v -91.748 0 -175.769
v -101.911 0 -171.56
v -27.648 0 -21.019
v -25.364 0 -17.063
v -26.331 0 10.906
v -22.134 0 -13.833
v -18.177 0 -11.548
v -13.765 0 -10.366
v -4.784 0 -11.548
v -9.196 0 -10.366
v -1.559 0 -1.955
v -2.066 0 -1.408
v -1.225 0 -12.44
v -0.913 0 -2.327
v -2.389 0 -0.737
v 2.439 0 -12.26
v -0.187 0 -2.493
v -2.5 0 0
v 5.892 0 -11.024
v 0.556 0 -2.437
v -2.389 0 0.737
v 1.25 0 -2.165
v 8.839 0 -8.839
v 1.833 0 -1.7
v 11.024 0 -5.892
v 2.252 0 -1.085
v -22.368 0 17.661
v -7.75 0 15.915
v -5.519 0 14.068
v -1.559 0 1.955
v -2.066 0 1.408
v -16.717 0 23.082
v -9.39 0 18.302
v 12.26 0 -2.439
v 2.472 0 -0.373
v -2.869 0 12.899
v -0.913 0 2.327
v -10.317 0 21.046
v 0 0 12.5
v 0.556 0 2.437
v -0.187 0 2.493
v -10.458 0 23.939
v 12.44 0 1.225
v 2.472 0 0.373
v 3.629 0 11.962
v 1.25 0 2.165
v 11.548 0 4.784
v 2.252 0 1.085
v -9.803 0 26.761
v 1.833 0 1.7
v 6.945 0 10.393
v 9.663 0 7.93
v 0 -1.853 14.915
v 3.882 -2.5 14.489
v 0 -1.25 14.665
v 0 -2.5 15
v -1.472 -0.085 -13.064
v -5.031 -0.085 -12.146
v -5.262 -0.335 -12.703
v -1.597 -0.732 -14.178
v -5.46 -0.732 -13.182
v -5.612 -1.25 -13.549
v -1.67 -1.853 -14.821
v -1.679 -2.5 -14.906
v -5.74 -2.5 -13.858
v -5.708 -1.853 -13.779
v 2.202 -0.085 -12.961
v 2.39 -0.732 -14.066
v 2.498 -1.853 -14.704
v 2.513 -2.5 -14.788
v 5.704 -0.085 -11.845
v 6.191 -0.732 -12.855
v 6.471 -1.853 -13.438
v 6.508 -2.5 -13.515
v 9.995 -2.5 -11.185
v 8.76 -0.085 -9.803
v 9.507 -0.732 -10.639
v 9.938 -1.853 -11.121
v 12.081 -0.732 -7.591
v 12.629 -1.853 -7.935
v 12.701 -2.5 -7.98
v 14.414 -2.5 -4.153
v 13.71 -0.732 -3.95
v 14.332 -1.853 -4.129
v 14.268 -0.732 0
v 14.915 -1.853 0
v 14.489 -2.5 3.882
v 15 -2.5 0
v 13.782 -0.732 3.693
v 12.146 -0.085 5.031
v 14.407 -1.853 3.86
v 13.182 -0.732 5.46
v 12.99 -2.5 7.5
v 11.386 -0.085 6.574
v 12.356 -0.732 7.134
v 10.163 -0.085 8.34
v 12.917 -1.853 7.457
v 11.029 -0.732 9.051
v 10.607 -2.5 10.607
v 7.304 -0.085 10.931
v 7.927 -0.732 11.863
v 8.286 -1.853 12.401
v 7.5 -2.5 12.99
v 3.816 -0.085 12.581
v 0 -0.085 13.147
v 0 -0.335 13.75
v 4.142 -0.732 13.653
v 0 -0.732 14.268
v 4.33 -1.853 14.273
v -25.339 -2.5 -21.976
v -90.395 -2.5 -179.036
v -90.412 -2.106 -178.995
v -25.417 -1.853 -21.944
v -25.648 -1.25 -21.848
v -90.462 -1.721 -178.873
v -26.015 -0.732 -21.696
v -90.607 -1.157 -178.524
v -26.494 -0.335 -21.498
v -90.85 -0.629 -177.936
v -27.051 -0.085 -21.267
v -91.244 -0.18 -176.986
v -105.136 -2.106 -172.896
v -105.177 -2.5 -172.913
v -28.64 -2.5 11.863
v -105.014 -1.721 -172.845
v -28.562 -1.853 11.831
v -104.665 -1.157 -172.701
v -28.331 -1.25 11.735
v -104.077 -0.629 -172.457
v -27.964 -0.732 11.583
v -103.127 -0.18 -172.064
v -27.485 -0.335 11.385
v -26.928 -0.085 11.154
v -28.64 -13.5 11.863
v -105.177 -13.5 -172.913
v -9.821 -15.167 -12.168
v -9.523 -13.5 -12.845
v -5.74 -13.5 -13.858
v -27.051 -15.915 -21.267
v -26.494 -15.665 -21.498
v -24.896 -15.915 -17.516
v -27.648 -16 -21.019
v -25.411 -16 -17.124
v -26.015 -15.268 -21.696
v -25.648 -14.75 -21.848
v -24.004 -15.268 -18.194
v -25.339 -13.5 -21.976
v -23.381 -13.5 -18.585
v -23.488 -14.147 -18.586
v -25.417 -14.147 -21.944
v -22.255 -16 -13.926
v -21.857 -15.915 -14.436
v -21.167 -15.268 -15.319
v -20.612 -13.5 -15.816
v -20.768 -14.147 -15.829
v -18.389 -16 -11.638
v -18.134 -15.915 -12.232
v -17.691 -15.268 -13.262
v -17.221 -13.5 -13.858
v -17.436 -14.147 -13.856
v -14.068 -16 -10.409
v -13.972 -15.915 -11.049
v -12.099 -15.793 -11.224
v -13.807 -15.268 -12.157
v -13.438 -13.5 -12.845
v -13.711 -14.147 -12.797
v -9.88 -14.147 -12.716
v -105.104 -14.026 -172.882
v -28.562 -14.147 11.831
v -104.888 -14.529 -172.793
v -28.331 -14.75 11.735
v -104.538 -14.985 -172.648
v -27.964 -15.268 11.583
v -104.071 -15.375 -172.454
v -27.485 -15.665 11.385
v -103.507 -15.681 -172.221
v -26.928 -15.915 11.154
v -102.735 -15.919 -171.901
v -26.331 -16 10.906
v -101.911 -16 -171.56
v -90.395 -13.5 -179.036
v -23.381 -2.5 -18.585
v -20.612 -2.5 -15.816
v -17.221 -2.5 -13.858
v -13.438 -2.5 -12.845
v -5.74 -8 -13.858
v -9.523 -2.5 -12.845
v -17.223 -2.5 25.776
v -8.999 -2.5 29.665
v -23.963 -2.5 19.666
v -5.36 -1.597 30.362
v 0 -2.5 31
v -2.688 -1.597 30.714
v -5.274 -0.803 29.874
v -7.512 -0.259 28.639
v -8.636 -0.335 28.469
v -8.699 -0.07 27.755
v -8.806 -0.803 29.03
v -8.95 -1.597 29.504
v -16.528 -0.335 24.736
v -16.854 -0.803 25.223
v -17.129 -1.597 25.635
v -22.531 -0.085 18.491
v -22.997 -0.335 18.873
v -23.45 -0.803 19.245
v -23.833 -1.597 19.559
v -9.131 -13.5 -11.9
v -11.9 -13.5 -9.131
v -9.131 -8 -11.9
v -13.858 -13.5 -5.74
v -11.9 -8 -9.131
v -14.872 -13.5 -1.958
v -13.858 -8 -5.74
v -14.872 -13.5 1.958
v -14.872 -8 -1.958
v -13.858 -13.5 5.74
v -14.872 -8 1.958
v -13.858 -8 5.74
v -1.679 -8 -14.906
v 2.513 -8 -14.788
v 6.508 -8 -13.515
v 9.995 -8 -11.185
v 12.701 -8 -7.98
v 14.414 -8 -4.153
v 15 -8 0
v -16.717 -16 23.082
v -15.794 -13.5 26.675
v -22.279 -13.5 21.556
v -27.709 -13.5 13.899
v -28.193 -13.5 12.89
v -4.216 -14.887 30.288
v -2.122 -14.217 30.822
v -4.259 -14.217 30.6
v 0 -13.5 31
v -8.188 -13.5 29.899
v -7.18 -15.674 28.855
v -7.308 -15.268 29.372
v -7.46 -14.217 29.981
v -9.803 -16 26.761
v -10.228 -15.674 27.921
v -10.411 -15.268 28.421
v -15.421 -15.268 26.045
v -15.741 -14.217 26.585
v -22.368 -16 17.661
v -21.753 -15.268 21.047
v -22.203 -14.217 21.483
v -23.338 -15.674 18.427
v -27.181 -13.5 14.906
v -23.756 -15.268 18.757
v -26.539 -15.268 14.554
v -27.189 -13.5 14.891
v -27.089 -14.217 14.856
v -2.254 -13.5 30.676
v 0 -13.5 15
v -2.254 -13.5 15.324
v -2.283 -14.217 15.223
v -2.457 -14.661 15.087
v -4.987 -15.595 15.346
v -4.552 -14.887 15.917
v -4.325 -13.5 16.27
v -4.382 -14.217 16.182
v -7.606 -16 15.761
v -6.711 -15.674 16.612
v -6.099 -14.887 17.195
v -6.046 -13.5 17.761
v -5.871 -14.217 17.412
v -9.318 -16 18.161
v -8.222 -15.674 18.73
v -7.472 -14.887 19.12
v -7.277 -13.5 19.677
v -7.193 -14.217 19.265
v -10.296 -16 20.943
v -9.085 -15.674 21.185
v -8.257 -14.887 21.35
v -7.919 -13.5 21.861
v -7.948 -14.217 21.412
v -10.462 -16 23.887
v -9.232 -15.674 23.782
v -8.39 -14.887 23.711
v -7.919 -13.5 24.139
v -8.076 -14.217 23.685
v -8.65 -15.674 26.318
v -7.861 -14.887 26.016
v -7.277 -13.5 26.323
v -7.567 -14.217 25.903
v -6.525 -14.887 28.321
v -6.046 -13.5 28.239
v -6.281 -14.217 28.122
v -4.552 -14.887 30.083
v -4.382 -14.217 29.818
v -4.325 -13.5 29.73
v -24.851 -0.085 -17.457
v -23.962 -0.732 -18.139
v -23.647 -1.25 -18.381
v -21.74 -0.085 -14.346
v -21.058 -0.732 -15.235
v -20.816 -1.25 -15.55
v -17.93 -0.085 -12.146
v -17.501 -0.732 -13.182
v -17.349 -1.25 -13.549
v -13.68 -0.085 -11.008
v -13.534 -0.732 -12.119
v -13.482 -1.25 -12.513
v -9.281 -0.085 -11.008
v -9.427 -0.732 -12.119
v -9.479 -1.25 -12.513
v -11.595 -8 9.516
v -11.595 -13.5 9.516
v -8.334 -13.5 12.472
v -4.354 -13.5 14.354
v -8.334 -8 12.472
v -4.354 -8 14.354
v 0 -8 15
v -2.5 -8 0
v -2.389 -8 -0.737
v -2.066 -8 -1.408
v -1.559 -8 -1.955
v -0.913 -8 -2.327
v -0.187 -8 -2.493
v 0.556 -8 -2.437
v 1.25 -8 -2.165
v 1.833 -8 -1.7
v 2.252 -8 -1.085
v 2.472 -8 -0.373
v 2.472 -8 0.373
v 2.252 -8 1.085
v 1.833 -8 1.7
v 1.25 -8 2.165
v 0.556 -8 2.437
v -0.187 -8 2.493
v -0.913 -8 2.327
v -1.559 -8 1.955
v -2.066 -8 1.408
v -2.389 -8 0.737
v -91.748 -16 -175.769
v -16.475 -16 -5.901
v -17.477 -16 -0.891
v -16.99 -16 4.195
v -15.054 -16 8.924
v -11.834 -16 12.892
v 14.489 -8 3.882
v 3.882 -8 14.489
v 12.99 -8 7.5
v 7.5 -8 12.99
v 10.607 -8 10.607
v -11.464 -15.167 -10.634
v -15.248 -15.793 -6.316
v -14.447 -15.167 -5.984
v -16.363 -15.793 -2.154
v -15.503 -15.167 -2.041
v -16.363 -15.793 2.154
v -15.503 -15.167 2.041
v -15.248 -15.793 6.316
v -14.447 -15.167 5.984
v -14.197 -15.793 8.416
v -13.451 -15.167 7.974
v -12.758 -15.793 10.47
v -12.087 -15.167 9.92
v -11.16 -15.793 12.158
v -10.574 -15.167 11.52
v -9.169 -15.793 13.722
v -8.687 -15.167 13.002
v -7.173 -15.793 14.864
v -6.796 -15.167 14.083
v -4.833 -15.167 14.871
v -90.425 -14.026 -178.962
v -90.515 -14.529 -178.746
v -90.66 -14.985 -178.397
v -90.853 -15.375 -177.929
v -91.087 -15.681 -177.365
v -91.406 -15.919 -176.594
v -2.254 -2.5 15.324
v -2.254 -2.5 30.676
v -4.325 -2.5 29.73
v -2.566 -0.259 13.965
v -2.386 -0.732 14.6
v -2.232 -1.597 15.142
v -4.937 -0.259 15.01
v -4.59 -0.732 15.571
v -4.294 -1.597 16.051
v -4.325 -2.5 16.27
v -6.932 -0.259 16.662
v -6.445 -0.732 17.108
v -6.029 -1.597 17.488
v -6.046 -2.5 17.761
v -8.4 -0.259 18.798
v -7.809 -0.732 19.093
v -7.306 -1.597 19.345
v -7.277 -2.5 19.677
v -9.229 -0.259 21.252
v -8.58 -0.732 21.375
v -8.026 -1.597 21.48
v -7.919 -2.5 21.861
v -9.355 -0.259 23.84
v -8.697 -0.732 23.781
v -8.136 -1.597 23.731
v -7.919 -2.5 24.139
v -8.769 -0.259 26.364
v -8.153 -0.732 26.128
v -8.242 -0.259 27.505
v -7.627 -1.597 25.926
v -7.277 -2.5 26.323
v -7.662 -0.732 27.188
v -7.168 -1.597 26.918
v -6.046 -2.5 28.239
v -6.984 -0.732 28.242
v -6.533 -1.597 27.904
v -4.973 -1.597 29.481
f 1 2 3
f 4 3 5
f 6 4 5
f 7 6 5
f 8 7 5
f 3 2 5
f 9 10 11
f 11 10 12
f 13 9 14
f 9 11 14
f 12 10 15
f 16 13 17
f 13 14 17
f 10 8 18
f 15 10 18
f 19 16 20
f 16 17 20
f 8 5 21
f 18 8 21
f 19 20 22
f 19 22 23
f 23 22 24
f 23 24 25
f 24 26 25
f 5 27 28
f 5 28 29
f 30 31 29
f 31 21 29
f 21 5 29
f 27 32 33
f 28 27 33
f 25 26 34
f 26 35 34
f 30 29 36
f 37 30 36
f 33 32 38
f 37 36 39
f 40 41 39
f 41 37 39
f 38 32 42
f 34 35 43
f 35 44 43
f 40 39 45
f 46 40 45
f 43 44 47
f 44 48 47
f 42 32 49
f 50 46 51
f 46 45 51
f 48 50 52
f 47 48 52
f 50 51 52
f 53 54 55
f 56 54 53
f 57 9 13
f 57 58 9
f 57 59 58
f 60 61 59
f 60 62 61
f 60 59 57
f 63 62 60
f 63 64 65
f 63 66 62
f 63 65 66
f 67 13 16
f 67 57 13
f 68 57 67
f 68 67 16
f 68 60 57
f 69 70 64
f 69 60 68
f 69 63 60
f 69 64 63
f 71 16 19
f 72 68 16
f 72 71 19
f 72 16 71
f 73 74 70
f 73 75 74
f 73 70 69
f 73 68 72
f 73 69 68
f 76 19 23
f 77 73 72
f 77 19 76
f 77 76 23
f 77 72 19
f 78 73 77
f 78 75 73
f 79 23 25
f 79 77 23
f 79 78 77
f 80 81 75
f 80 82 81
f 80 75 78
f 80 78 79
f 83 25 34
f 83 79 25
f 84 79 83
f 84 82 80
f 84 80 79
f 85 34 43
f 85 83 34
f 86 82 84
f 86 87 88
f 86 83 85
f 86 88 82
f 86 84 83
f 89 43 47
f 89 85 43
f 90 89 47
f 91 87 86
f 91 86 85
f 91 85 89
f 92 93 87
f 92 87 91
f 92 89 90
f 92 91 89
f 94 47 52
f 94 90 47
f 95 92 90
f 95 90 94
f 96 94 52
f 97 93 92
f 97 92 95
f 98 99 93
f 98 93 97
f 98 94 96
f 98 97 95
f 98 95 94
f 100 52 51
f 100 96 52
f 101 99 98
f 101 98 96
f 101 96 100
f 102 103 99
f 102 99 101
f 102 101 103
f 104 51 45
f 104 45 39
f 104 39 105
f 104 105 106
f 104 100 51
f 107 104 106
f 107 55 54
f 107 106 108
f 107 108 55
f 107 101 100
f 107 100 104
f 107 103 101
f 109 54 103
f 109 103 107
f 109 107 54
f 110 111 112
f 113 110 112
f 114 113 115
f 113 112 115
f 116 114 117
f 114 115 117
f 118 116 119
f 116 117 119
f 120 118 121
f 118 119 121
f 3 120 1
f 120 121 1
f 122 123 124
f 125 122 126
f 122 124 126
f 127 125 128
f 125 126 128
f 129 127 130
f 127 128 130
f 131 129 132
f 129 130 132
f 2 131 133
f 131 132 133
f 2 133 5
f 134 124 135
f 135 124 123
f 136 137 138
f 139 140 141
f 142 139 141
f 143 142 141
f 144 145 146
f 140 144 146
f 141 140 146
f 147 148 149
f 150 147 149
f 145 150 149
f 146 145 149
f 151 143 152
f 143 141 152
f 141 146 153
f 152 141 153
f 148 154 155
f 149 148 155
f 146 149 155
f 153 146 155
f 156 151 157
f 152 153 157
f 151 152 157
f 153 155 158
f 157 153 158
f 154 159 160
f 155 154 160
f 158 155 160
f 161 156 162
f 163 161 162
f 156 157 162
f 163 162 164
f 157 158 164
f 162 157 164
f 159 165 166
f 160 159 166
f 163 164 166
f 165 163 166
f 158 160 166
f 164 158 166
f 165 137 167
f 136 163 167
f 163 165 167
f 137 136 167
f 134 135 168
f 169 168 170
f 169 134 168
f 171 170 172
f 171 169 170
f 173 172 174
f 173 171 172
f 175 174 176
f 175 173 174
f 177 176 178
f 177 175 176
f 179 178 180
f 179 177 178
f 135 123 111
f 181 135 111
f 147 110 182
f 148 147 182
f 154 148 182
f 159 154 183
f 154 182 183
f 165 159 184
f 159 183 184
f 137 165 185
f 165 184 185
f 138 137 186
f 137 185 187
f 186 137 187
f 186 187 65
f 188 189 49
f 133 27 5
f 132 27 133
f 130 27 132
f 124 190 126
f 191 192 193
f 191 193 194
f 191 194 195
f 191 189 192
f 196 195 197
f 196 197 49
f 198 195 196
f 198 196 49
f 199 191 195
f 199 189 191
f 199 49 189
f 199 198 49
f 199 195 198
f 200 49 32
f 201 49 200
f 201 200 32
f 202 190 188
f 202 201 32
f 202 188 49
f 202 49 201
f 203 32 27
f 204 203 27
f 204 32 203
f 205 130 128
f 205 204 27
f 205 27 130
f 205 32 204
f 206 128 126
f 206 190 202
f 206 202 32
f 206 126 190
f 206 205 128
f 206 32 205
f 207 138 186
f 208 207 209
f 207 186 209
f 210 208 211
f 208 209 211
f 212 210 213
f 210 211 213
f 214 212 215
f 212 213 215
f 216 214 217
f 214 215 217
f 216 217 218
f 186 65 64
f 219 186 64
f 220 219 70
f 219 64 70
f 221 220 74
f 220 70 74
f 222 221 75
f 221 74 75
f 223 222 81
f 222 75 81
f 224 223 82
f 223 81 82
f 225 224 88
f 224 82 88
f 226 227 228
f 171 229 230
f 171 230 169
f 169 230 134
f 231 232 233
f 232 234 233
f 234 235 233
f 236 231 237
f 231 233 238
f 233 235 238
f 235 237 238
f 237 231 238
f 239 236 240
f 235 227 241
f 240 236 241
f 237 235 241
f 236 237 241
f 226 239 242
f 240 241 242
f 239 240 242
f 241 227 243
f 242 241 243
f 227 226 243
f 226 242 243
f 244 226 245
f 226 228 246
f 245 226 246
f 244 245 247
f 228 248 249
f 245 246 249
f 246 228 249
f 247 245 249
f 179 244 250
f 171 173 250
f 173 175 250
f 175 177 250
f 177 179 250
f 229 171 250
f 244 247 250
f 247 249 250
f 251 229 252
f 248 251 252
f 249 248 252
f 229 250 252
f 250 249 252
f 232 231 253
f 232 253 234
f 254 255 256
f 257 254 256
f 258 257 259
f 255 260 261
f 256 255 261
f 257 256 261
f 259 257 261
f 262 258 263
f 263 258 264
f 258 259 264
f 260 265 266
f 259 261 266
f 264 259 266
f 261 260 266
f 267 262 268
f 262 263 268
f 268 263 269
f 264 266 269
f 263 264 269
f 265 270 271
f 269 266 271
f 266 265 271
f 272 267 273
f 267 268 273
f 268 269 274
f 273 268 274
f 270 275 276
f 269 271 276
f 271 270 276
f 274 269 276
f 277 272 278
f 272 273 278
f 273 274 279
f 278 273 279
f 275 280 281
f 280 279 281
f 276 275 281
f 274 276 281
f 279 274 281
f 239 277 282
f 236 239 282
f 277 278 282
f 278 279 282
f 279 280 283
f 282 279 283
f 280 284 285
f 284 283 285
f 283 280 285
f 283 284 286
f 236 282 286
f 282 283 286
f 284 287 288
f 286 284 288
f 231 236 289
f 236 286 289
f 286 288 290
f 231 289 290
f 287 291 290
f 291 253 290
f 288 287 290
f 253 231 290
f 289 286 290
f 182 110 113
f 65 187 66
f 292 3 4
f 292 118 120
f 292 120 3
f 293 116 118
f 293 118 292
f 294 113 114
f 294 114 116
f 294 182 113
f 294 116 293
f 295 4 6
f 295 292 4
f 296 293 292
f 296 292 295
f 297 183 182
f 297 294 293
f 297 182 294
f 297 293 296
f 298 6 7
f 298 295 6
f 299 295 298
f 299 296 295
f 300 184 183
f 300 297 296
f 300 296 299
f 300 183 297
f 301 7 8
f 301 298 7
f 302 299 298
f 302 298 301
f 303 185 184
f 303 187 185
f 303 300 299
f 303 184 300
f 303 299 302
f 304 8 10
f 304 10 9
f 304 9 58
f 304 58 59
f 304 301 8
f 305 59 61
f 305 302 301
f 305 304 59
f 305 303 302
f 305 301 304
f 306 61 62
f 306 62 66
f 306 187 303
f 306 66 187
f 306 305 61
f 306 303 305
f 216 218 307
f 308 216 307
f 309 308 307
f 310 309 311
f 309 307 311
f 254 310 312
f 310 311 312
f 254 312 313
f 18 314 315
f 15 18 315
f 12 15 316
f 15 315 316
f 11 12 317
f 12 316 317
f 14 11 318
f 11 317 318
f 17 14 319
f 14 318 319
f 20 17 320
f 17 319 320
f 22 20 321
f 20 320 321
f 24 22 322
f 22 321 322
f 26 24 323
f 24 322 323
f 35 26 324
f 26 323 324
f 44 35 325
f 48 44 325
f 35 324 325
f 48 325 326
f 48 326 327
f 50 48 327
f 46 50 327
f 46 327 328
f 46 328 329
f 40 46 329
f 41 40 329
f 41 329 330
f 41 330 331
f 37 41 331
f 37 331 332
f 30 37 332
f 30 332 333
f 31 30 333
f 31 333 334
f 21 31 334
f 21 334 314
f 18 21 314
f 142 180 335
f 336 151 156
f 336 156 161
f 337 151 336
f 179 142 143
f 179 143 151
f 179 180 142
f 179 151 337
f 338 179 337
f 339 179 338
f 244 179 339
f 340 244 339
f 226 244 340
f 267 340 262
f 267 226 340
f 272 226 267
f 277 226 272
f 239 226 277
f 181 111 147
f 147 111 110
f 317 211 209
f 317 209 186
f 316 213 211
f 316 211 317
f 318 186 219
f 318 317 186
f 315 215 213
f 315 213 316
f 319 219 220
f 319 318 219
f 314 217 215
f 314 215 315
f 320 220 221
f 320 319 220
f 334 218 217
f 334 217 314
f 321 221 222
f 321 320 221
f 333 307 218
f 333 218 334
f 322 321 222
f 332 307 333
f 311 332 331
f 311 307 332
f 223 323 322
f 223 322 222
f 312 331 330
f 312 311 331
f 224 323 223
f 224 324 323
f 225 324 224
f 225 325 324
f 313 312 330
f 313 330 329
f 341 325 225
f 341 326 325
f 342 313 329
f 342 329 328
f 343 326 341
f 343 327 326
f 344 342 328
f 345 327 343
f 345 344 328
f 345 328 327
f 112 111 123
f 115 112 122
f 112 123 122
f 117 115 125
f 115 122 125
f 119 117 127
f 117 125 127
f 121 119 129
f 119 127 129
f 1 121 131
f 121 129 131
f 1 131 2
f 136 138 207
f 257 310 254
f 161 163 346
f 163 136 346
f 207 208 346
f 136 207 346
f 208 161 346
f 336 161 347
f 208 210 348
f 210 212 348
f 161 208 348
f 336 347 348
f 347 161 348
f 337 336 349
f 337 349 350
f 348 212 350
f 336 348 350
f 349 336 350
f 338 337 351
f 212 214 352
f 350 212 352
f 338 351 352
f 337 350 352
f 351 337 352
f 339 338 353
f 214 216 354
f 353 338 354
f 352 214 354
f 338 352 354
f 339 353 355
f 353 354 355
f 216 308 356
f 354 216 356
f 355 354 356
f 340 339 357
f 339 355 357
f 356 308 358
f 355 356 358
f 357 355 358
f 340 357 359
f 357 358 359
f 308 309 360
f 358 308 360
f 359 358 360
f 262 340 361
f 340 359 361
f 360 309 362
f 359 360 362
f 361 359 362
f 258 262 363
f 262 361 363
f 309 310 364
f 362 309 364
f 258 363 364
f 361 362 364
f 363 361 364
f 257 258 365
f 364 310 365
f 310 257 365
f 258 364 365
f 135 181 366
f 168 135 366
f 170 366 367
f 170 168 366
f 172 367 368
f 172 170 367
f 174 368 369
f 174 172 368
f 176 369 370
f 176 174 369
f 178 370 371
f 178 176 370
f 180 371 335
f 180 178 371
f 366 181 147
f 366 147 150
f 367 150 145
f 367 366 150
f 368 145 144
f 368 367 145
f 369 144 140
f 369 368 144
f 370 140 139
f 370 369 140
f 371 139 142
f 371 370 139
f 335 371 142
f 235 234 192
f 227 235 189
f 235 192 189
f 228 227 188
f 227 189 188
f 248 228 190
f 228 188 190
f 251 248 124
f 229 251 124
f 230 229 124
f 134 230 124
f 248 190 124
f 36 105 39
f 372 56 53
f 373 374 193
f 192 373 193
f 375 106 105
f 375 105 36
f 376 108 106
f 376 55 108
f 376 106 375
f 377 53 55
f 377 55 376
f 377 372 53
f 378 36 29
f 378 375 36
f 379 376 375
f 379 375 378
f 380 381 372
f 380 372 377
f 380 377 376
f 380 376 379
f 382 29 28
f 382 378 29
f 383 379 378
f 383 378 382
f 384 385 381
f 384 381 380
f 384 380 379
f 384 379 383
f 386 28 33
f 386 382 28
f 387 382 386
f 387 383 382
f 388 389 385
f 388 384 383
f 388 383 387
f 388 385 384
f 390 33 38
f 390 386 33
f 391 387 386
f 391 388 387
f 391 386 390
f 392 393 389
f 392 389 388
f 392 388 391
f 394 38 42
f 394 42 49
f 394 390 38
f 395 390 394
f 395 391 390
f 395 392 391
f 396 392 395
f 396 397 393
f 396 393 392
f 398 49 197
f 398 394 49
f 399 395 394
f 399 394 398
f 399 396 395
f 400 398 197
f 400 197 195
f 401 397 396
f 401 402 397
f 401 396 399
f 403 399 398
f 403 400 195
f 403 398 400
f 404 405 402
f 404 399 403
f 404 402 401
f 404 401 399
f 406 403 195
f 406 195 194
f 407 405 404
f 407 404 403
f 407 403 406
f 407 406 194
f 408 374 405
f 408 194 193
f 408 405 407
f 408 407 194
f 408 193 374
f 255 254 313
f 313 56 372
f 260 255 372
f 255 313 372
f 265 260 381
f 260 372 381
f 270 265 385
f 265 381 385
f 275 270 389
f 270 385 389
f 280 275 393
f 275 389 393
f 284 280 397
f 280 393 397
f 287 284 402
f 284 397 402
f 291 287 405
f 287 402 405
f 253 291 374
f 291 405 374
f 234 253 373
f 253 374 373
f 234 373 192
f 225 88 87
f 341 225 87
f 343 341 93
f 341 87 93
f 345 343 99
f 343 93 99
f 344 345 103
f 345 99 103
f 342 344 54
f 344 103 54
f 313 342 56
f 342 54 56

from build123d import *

# Parameters (mm, degrees)
F1_DEPTH     = 16
F2_DEPTH     = 8
F3_T1_DEPTH  = 28.5
F3_T3_DEPTH  = 176.25
F3_T5_DEPTH  = 206.25
F3_T8_ANGLE  = 113.8828315396
F3_T10_ANGLE = 205.3052563157
F3_T12_ANGLE = 301.0526480562
F3_T14_ANGLE = 87.1421031631
F3_T16_ANGLE = 90
F3_T18_ANGLE = 202.4999999088
F3_T20_ANGLE = 256.2183340246
F3_T22_ANGLE = 87.1421031631
F4_D         = 5


# Not quite as in the source:
# - a fillet or chamfer that OpenCascade refuses, or shapes differently, is made with other operations: its cross-section is extruded or revolved along the edge and cut away or added


with BuildPart() as f1:
    # F0 (on Front) → F1 (new body)
    with BuildSketch(Plane.XZ):
        Polygon((-25.3386959586, -21.9761344899), (-13.8581929877, 5.7402514855), (-28.6402655078, 11.8631864033), (-105.1769519809, -172.9127200989), (-90.3948794607, -179.0356550168), align=None)
        with BuildLine():
            Line((-28.6402655078, 11.8631864033), (-13.8581929877, 5.7402514855))
            ThreePointArc((-13.8581929877, 5.7402514855), (-8.3335534854, 12.4720441912), (2.39e-08, 15))
            ThreePointArc((2.39e-08, 15), (-8, 22.9999999881), (0, 31))
            ThreePointArc((0, 31), (-17.2226772236, 25.7755579814), (-28.6402655078, 11.8631864033))
        make_face()
        with BuildLine():
            ThreePointArc((-5.7402514855, -13.8581929877), (-13.8581929877, -5.7402514855), (-13.8581929877, 5.7402514855))
            Line((-13.8581929877, 5.7402514855), (-25.3386959586, -21.9761344899))
            ThreePointArc((-25.3386959586, -21.9761344899), (-17.2207544564, -13.8581929877), (-5.7402514855, -13.8581929877))
        make_face()
    extrude(amount=F1_DEPTH)

    # F0 (on Front) → F2 (join)
    with BuildSketch(Plane.XZ):
        with BuildLine():
            Line((0, 0), (-13.8581929877, 5.7402514855))
            ThreePointArc((-13.8581929877, 5.7402514855), (-13.8581929877, -5.7402514855), (-5.7402514855, -13.8581929877))
            Line((-5.7402514855, -13.8581929877), (0, 0))
        make_face()
        with BuildLine():
            ThreePointArc((2.39e-08, 15), (-8.3335534854, 12.4720441912), (-13.8581929877, 5.7402514855))
            Line((-13.8581929877, 5.7402514855), (0, 0))
            Line((0, 0), (-5.7402514855, -13.8581929877))
            ThreePointArc((-5.7402514855, -13.8581929877), (8.3335534953, -12.4720441845), (15, 0))
            ThreePointArc((15, 0), (10.6066017262, 10.6066017094), (2.39e-08, 15))
        make_face()
    extrude(amount=F2_DEPTH)

    # F3: fillet of radius 2.5 on 14 edges, made by hand

    # F3_s2 → F3_t1 (cut)
    with BuildSketch(Plane(origin=(-34.414512586, 0, 14.2549578556), x_dir=(0, 1, 0), z_dir=(0.9238795325, 0, -0.3826834324))):
        with BuildLine():
            ThreePointArc((-13.5, -200), (-15.267766953, -199.267766953), (-16, -197.5))
            Line((-16, -197.5), (-16, -200))
            Line((-16, -200), (-13.5, -200))
        make_face()
        with BuildLine():
            ThreePointArc((-2.5, -200), (-0.732233047, -199.267766953), (0, -197.5))
            Line((0, -197.5), (0, -200))
            Line((0, -200), (-2.5, -200))
        make_face()
    extrude(amount=F3_T1_DEPTH, mode=Mode.SUBTRACT)

    # F3_s4 → F3_t3 (cut)
    with BuildSketch(Plane(origin=(-78.9284579253, 0, -190.5501535805), x_dir=(0, 1, 0), z_dir=(0.3826834324, 0, 0.9238795325))):
        with BuildLine():
            ThreePointArc((-13.5, 15), (-15.267766953, 15.732233047), (-16, 17.5))
            Line((-16, 17.5), (-16, 15))
            Line((-16, 15), (-13.5, 15))
        make_face()
        with BuildLine():
            ThreePointArc((-2.5, 15), (-0.732233047, 15.732233047), (0, 17.5))
            Line((0, 17.5), (0, 15))
            Line((0, 15), (-2.5, 15))
        make_face()
    extrude(amount=F3_T3_DEPTH, mode=Mode.SUBTRACT)

    # F3_s6 → F3_t5 (cut)
    with BuildSketch(Plane(origin=(0, 0, 0), x_dir=(0, 1, 0), z_dir=(-0.3826834324, 0, -0.9238795325))):
        with BuildLine():
            ThreePointArc((-13.5, -31), (-15.267766953, -30.267766953), (-16, -28.5))
            Line((-16, -28.5), (-16, -31))
            Line((-16, -31), (-13.5, -31))
        make_face()
        with BuildLine():
            ThreePointArc((-2.5, -31), (-0.732233047, -30.267766953), (0, -28.5))
            Line((0, -28.5), (0, -31))
            Line((0, -31), (-2.5, -31))
        make_face()
    extrude(amount=F3_T5_DEPTH, mode=Mode.SUBTRACT)

    # F3_s7 → F3_t8 (revolve, cut)
    with BuildSketch(Plane(origin=(-11.480502971, 0, -27.7163859753), x_dir=(0, 1, 0), z_dir=(-0.3826834324, 0, -0.9238795325))):
        with BuildLine():
            ThreePointArc((-16, -17.5), (-15.267766953, -15.732233047), (-13.5, -15))
            Line((-13.5, -15), (-16, -15))
            Line((-16, -15), (-16, -17.5))
        make_face()
    revolve(axis=Axis((-11.480502971, -16, -27.7163859753), (0, 1, 0)), revolution_arc=F3_T8_ANGLE, mode=Mode.SUBTRACT)

    # F3_s9 → F3_t10 (revolve, cut)
    with BuildSketch(Plane(origin=(0, 0, 0), x_dir=(0, 1, 0), z_dir=(0.999700368, 0, 0.0244780336))):
        with BuildLine():
            ThreePointArc((-16, -17.5), (-15.267766953, -15.732233047), (-13.5, -15))
            Line((-13.5, -15), (-16, -15))
            Line((-16, -15), (-16, -17.5))
        make_face()
    revolve(axis=Axis((0, -16, 0), (0, 1, 0)), revolution_arc=F3_T10_ANGLE, mode=Mode.SUBTRACT)

    # F3_s11 → F3_t12 (revolve, cut)
    with BuildSketch(Plane(origin=(11.4998076678, 0, 11.4334898289), x_dir=(0, 1, 0), z_dir=(0.7091486068, 0, 0.7050590425))):
        with BuildLine():
            ThreePointArc((-16, 5.8104179571), (-15.267766953, 7.5781849101), (-13.5, 8.3104179571))
            Line((-13.5, 8.3104179571), (-16, 8.3104179571))
            Line((-16, 8.3104179571), (-16, 5.8104179571))
        make_face()
    revolve(axis=Axis((0, -16, 23), (0, 1, 0)), revolution_arc=F3_T12_ANGLE, mode=Mode.SUBTRACT)

    # F3_s13 → F3_t14 (revolve, cut)
    with BuildSketch(Plane(origin=(0, 0, 0), x_dir=(0, 1, 0), z_dir=(0.9418106956, 0, -0.3361437395))):
        with BuildLine():
            ThreePointArc((-16, 28.5), (-15.267766953, 30.267766953), (-13.5, 31))
            Line((-13.5, 31), (-16, 31))
            Line((-16, 31), (-16, 28.5))
        make_face()
    revolve(axis=Axis((0, -16, 0), (0, -1, 0)), revolution_arc=F3_T14_ANGLE, mode=Mode.SUBTRACT)

    # F3_s15 → F3_t16 (revolve, cut)
    with BuildSketch(Plane(origin=(-11.480502971, 0, -27.7163859753), x_dir=(0, 1, 0), z_dir=(-0.3826834324, 0, -0.9238795325))):
        with BuildLine():
            ThreePointArc((0, -17.5), (-0.732233047, -15.732233047), (-2.5, -15))
            Line((-2.5, -15), (0, -15))
            Line((0, -15), (0, -17.5))
        make_face()
    revolve(axis=Axis((-11.480502971, 0, -27.7163859753), (0, 1, 0)), revolution_arc=F3_T16_ANGLE, mode=Mode.SUBTRACT)

    # F3_s17 → F3_t18 (revolve, cut)
    with BuildSketch(Plane(origin=(0, 0, 0), x_dir=(0, 1, 0), z_dir=(-0.9238795325, 0, 0.3826834324))):
        with BuildLine():
            ThreePointArc((0, 12.5), (-0.732233047, 14.267766953), (-2.5, 15))
            Line((-2.5, 15), (0, 15))
            Line((0, 15), (0, 12.5))
        make_face()
    revolve(axis=Axis((0, 0, 0), (0, -1, 0)), revolution_arc=F3_T18_ANGLE, mode=Mode.SUBTRACT)

    # F3_s19 → F3_t20 (revolve, cut)
    with BuildSketch(Plane.YZ):
        with BuildLine():
            ThreePointArc((0, 12.5), (-0.732233047, 14.267766953), (-2.5, 15))
            Line((-2.5, 15), (0, 15))
            Line((0, 15), (0, 12.5))
        make_face()
    revolve(axis=Axis((0, 0, 23), (0, 1, 0)), revolution_arc=F3_T20_ANGLE, mode=Mode.SUBTRACT)

    # F3_s21 → F3_t22 (revolve, cut)
    with BuildSketch(Plane(origin=(0, 0, 0), x_dir=(0, 1, 0), z_dir=(0.9418106956, 0, -0.3361437395))):
        with BuildLine():
            ThreePointArc((0, 28.5), (-0.732233047, 30.267766953), (-2.5, 31))
            Line((-2.5, 31), (0, 31))
            Line((0, 31), (0, 28.5))
        make_face()
    revolve(axis=Axis((0, 0, 0), (0, -1, 0)), revolution_arc=F3_T22_ANGLE, mode=Mode.SUBTRACT)

    # F4 (through all)
    with Locations(Plane(origin=(0, 0, 0), x_dir=(1, 0, 0), z_dir=(0, 1, 0))):
        with Locations((0, 0)):
            Hole(F4_D / 2)


solid = f1.part
